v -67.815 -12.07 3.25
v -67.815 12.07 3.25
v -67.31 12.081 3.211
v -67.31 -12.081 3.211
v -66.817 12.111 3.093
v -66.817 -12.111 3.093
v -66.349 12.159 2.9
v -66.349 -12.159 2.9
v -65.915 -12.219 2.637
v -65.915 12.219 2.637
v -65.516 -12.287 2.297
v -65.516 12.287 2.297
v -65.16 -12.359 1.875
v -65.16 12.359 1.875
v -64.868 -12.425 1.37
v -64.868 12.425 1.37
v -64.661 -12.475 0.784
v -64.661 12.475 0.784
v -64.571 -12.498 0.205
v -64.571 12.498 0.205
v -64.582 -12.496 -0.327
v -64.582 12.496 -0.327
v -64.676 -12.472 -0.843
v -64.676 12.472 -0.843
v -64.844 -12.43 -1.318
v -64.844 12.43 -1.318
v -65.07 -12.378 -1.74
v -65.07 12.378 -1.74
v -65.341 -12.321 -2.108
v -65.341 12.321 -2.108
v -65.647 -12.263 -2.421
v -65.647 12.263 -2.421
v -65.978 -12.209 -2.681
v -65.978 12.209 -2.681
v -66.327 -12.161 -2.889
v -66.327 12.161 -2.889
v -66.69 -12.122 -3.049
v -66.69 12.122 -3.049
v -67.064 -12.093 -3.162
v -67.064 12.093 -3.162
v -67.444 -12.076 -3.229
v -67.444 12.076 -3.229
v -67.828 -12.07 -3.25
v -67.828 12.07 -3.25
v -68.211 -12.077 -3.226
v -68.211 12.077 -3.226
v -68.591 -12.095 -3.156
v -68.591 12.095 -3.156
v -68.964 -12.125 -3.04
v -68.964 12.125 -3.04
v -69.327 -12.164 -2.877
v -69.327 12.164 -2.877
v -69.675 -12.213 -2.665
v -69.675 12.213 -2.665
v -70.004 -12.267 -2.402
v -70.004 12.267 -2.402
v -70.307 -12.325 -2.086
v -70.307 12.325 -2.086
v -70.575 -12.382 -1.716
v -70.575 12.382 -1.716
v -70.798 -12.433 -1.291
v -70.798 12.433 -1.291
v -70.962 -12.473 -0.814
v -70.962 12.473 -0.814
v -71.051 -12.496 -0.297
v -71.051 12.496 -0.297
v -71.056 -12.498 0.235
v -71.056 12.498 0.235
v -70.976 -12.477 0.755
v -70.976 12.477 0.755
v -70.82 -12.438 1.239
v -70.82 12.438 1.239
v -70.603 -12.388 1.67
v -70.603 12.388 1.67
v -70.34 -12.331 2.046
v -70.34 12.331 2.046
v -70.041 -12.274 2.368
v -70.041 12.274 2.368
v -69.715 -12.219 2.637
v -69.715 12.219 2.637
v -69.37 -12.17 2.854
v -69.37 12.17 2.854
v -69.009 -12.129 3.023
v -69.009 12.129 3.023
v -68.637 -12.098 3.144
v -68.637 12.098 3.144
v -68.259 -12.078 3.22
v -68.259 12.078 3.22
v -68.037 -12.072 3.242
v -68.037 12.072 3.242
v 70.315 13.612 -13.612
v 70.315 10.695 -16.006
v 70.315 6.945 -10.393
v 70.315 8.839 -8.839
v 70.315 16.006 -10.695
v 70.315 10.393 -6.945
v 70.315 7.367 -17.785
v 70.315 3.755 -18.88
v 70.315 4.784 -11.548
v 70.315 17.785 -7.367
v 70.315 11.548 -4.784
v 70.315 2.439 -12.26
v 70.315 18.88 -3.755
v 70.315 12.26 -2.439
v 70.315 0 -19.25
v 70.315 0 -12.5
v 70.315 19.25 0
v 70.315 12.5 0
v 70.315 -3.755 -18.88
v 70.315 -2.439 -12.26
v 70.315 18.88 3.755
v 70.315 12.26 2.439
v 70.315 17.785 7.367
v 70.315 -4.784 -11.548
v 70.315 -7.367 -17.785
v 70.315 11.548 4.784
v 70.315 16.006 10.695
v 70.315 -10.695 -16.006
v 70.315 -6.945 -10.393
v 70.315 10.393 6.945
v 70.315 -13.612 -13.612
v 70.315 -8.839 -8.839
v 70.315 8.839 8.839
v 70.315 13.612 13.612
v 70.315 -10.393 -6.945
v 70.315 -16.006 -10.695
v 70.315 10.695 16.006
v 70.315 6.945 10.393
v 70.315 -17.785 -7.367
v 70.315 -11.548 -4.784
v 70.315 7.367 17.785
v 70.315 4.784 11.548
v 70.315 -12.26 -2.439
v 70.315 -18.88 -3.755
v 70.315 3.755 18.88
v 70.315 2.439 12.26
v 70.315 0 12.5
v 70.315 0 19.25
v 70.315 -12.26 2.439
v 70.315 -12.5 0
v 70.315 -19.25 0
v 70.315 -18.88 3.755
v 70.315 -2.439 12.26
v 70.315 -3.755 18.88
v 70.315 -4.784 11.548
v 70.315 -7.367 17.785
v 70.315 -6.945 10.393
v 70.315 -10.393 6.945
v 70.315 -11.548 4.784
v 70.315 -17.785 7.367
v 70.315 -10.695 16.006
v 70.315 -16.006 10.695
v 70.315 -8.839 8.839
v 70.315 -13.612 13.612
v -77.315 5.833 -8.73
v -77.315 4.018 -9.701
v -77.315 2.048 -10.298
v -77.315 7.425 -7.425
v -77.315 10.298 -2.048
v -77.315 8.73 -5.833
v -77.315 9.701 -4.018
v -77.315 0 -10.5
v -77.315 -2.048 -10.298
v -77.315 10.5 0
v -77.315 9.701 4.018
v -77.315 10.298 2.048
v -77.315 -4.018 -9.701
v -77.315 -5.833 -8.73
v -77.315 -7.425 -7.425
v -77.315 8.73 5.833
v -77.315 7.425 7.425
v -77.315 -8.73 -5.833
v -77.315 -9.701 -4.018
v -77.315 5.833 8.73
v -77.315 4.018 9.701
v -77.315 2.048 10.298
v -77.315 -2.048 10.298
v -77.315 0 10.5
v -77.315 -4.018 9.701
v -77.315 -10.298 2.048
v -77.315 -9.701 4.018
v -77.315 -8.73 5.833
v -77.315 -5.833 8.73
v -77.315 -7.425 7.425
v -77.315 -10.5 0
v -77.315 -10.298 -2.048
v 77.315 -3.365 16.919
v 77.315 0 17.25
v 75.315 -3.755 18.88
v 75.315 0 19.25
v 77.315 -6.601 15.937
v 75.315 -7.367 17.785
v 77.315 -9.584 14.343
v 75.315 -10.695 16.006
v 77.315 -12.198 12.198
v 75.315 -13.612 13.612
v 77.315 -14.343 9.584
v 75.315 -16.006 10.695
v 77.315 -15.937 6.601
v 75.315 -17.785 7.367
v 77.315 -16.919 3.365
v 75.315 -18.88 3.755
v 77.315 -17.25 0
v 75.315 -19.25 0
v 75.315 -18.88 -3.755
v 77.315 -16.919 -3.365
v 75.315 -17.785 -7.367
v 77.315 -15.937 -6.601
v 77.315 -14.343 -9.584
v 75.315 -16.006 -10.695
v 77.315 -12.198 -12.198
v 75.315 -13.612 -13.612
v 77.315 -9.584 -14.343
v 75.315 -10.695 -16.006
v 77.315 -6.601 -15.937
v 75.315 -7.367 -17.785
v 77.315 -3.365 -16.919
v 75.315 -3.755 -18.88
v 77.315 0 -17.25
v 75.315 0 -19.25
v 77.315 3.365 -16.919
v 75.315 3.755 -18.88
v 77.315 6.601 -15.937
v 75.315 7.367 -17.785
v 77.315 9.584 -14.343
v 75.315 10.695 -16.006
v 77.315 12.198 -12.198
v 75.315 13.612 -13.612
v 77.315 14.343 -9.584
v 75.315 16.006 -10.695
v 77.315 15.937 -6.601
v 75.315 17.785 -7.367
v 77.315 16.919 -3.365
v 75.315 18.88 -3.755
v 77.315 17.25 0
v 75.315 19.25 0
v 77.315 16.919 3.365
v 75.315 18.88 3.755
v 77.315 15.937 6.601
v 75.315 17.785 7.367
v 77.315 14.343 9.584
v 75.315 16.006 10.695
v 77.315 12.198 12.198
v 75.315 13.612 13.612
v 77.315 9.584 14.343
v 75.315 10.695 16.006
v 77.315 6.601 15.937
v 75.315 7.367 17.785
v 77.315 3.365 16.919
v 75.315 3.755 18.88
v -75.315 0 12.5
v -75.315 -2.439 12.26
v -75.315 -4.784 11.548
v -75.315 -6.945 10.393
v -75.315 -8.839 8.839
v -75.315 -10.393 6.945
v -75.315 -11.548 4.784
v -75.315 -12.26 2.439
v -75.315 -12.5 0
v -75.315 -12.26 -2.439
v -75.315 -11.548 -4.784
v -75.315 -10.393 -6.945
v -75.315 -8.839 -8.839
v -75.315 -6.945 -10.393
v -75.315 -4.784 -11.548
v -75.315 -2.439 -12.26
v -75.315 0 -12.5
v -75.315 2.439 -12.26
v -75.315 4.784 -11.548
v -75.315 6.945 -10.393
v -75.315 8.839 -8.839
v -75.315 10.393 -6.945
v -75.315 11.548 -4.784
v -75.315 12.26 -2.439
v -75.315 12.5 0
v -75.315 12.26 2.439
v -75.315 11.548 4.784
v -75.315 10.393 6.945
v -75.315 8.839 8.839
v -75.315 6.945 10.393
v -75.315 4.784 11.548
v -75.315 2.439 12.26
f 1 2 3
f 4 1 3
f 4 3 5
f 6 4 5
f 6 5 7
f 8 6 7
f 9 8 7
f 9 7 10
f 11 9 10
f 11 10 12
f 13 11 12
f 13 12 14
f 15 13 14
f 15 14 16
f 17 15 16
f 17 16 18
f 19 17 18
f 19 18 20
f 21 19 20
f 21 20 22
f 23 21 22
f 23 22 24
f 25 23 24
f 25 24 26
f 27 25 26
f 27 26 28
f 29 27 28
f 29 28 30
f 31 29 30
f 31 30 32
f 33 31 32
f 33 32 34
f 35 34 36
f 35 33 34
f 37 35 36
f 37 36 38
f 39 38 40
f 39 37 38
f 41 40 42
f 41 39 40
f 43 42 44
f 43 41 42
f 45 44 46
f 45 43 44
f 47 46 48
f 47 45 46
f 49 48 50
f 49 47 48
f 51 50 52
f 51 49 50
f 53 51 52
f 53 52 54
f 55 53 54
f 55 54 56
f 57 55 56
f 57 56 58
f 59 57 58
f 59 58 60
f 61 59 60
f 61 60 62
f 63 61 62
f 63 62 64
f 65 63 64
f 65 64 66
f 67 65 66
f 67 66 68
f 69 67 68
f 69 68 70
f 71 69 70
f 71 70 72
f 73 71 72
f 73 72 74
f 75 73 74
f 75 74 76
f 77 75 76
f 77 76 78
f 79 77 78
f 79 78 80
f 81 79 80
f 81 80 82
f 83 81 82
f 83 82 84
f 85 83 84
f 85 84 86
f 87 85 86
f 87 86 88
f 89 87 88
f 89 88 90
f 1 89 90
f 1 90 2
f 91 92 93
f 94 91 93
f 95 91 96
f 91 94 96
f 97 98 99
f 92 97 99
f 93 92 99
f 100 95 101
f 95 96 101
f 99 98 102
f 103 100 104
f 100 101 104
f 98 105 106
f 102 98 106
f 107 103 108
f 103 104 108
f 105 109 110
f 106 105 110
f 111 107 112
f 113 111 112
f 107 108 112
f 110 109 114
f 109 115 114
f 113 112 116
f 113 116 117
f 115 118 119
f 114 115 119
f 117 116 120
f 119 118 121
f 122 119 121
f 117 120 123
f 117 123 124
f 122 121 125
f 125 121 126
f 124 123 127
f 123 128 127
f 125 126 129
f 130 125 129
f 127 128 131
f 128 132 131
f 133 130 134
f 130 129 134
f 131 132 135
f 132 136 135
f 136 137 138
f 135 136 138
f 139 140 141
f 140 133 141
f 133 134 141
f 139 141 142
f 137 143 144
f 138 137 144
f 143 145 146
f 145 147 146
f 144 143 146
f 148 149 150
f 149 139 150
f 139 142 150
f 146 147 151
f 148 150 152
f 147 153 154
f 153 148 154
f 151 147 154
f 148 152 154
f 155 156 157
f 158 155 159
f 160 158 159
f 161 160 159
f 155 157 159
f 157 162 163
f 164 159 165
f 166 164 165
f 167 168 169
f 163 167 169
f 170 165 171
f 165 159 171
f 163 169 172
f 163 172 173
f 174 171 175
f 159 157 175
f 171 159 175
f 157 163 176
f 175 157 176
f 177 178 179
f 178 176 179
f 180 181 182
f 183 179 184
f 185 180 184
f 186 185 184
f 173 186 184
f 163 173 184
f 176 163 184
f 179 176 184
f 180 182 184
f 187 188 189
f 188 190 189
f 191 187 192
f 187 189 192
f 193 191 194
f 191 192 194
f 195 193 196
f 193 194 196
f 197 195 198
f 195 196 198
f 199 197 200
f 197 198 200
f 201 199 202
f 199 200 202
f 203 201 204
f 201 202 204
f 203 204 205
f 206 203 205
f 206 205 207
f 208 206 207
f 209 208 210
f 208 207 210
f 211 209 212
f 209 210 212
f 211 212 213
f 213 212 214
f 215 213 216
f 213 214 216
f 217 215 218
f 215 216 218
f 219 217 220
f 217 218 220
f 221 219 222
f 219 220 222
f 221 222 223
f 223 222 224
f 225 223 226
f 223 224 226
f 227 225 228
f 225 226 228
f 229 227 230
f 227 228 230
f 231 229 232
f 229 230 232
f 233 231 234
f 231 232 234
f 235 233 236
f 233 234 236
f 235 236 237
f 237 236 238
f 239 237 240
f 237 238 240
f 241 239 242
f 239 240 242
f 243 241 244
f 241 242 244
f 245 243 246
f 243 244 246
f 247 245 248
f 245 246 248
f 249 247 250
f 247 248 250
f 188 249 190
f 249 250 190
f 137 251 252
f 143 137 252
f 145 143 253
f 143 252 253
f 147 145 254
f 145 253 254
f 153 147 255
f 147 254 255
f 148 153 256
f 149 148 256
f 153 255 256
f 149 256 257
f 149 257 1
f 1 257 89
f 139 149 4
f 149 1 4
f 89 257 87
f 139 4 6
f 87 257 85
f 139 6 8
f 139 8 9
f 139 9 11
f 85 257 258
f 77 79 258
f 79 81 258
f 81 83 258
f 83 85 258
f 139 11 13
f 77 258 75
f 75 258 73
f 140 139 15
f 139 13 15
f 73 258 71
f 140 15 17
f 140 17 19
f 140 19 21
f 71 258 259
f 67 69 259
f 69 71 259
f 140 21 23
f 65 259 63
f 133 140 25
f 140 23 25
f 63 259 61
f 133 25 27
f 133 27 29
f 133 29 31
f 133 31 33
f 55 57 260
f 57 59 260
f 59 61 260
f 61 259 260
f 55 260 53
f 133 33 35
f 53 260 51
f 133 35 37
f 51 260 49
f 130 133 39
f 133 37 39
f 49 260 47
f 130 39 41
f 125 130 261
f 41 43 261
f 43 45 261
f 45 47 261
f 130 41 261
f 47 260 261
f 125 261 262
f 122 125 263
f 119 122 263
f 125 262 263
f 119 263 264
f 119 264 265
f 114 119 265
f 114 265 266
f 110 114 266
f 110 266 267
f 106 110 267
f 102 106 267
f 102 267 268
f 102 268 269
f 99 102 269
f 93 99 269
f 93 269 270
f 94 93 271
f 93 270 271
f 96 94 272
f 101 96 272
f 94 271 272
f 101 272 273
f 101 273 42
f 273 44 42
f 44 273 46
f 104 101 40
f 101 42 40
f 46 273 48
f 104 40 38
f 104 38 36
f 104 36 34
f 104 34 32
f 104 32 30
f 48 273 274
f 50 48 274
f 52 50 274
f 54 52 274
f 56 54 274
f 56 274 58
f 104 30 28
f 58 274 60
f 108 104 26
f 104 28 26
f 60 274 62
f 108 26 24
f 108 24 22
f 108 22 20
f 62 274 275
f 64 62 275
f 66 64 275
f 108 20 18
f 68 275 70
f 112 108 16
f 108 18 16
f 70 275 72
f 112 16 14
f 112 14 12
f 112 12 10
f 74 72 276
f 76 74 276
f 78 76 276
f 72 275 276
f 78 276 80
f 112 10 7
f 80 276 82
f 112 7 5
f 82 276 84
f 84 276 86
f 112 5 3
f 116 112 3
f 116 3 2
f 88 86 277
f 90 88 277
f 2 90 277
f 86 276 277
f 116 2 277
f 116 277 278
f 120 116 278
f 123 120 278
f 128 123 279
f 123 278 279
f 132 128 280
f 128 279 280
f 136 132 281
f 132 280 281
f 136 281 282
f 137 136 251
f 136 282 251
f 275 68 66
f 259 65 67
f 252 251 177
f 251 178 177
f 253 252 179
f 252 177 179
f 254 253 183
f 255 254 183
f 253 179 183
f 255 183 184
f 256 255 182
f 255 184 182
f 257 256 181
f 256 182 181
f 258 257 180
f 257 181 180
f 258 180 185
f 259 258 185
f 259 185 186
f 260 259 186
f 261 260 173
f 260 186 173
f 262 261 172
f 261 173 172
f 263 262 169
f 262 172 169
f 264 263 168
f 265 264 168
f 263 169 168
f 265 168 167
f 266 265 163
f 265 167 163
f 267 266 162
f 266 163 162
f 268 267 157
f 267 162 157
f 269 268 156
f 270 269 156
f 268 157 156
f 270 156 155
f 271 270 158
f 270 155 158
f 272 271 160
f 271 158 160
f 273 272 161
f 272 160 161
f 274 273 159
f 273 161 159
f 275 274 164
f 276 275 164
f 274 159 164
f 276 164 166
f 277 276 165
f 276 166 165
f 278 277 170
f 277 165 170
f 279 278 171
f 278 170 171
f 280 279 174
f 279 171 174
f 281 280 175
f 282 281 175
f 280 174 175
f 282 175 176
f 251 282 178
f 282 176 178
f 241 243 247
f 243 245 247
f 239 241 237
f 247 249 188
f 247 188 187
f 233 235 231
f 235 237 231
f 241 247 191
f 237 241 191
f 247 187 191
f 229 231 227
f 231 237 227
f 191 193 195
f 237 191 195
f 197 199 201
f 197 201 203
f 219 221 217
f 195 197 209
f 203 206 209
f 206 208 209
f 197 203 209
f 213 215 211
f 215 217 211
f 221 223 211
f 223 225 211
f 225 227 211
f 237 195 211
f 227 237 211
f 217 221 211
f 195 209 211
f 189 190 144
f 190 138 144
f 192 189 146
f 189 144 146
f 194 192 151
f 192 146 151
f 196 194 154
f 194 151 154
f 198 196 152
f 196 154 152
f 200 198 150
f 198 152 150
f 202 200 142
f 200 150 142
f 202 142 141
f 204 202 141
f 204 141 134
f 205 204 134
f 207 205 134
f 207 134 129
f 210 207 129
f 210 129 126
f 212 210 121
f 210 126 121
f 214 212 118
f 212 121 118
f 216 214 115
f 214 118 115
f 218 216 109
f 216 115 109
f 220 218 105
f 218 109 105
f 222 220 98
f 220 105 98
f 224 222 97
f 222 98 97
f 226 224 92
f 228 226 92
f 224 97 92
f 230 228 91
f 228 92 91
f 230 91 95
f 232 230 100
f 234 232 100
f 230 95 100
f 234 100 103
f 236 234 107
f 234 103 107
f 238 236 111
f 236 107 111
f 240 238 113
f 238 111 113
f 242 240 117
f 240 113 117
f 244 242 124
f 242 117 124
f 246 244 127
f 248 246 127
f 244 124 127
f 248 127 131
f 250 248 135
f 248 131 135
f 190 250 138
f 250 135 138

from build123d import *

# Parameters (mm, degrees)
CORTE_EXTRUS_O1_DEPTH      = 82.967885327
CORTE_EXTRUS_O1_DEPTH_BACK = 82.967885327
ESBO_O2_R                  = 3.25


with BuildPart() as part:
    # Esboço1 → Revolução1 (revolve)
    with BuildSketch(Plane.XY, mode=Mode.PRIVATE) as revolu_o1_sk:
        Polygon((77.315, 0), (77.315, 17.25), (75.315, 19.25), (70.315, 19.25), (70.315, 12.5), (-75.315, 12.5), (-77.315, 10.5), (-77.315, 0), align=None)
    revolve(revolu_o1_sk.sketch.rotate(Axis((-77.315, 0, 0), (1, 0, 0)), 90), axis=Axis((-77.315, 0, 0), (1, 0, 0)))

    # Esboço2 → Corte-extrusão1 (cut, two sides: drawn at the far end of the back side and taken through both)
    with BuildSketch(Plane(origin=(0, 0, 0), x_dir=(1, 0, 0), z_dir=(0, 1, 0)).offset(-CORTE_EXTRUS_O1_DEPTH_BACK)):
        with Locations(Location((-67.815, 0, 0), (0, 0, 270))):
            Circle(ESBO_O2_R)
    extrude(amount=CORTE_EXTRUS_O1_DEPTH + CORTE_EXTRUS_O1_DEPTH_BACK, mode=Mode.SUBTRACT)


solid = part.part
